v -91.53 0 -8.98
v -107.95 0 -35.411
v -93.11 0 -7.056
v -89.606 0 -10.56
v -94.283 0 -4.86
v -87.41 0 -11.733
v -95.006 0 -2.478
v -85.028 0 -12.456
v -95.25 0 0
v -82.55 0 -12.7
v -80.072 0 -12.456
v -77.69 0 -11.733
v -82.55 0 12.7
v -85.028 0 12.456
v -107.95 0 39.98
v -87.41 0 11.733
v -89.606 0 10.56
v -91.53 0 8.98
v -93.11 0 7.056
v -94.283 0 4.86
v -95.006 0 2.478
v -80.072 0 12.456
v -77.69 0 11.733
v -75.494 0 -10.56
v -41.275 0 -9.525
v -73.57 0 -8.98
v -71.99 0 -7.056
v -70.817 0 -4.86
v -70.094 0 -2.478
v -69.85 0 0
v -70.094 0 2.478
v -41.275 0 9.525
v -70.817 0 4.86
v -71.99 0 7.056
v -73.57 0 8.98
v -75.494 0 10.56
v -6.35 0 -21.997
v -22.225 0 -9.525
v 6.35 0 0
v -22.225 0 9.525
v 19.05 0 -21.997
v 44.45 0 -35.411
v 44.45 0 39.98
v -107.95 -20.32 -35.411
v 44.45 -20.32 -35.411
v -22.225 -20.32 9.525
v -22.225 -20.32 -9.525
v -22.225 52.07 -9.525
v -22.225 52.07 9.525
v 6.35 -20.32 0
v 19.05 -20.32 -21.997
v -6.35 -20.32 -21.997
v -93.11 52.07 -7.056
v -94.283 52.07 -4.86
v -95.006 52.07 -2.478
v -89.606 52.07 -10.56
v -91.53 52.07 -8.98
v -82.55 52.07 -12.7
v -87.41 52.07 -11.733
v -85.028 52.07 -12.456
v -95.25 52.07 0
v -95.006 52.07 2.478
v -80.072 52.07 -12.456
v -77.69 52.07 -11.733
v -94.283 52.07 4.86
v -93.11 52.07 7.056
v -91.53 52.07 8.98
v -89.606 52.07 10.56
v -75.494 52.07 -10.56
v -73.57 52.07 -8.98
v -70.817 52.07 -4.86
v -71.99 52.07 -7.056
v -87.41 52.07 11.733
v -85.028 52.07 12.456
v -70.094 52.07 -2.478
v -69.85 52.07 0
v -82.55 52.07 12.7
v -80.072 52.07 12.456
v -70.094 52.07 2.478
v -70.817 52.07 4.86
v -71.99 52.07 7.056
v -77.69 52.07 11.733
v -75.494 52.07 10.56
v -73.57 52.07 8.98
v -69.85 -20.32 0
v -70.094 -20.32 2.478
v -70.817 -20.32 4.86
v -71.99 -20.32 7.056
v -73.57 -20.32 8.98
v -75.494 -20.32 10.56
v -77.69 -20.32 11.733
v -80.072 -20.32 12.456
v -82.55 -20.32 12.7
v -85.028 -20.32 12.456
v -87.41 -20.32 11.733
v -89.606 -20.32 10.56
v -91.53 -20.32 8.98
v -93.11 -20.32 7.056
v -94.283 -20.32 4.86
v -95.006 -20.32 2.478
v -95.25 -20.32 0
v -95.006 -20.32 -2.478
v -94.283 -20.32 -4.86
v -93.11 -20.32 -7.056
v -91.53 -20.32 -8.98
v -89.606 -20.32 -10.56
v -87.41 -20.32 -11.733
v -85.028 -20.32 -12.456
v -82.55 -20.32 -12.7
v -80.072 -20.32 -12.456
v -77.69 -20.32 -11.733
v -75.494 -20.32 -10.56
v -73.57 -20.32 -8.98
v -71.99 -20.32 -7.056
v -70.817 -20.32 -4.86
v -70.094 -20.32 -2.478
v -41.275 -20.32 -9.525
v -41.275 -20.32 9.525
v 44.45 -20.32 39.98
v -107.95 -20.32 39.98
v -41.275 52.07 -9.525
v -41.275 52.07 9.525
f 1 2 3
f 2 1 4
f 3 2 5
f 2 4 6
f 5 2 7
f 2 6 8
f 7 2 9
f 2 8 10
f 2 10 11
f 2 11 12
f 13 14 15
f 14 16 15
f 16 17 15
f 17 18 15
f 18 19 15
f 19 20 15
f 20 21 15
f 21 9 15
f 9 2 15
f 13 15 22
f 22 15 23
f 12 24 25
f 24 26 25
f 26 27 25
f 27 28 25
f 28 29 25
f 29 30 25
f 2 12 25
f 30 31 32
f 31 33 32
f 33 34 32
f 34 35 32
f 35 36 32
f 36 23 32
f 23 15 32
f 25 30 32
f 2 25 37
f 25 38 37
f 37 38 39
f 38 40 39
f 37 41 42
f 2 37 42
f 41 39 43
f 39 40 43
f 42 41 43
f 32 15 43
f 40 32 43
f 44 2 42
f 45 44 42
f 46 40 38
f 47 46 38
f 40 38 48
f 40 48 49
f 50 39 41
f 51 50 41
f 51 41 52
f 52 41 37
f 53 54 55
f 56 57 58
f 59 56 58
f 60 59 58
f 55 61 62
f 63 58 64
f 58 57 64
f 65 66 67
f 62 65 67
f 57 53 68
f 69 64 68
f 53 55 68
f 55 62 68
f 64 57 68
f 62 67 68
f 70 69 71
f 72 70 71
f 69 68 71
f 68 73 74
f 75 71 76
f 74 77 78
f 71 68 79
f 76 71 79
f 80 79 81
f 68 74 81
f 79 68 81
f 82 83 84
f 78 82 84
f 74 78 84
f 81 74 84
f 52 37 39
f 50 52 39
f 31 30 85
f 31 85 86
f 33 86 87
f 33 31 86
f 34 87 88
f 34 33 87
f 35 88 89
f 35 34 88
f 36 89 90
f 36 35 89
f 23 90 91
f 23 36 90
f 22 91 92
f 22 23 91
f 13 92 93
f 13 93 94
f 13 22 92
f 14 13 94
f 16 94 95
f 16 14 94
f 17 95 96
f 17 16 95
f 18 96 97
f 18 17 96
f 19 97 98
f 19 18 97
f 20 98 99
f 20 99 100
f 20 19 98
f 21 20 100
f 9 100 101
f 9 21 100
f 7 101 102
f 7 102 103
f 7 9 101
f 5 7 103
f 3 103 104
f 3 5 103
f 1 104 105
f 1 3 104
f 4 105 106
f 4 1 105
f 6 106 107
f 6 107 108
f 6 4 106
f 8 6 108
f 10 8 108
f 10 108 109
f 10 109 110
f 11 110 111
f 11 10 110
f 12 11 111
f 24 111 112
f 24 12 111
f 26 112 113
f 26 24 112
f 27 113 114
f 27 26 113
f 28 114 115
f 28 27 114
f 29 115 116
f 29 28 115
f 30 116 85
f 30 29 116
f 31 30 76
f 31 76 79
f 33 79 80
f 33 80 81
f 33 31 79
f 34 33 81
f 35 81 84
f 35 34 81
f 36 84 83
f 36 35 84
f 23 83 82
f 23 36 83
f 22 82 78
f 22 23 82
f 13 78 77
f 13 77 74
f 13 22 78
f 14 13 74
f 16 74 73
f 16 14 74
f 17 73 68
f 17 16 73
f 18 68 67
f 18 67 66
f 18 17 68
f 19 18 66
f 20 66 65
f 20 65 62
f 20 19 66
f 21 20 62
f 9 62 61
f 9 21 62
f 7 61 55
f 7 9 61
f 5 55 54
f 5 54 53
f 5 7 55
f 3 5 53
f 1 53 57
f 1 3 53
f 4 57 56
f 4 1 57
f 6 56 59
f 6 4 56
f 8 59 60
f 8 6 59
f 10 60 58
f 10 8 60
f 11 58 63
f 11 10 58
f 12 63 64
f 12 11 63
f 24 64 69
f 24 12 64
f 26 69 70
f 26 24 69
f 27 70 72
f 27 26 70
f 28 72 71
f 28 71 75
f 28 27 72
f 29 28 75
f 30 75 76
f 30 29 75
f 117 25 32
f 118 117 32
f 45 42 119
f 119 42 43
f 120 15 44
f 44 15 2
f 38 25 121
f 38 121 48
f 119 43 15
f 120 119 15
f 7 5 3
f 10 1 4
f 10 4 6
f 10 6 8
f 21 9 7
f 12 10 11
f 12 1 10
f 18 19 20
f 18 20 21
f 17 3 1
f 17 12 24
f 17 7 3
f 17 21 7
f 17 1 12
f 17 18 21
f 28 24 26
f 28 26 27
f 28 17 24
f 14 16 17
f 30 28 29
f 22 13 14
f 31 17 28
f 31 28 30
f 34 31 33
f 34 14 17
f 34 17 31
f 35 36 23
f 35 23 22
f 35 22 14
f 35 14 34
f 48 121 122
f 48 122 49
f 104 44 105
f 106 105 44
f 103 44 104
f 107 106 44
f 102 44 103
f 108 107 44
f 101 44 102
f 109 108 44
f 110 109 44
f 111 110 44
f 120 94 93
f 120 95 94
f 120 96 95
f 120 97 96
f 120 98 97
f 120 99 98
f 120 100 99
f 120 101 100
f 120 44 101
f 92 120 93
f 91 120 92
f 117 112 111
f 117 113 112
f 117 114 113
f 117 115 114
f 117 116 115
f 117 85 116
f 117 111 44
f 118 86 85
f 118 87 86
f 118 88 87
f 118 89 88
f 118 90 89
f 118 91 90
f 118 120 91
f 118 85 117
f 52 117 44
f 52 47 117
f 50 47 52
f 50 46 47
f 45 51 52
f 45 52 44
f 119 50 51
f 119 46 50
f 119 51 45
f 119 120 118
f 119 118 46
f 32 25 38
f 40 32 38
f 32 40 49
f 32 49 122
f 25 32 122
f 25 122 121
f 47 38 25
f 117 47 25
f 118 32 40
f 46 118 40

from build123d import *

# Parameters (mm, degrees)
F0_R     = 12.7
F1_DEPTH = 52.07
F2_DEPTH = 20.32


with BuildPart() as f1:
    # F0 (on Front) → F1 (new body)
    with BuildSketch(Plane.XZ):
        with Locations((-82.55, 0)):
            Circle(F0_R)
        Polygon((-31.75, 0), (-22.225, 0), (-22.225, 9.525), (-41.275, 9.525), (-41.275, 0), align=None)
        Polygon((-22.225, -9.525), (-22.225, 0), (-31.75, 0), (-41.275, 0), (-41.275, -9.525), align=None)
    extrude(amount=-F1_DEPTH)


with BuildPart() as f2:
    # F0 (on Front) → F2 (new body)
    with BuildSketch(Plane.XZ):
        with Locations((-82.55, 0)):
            Circle(F0_R)
        Polygon((-107.95, -35.411008), (0, -35.411008), (44.45, -35.411008), (44.45, 39.980177), (-107.95, 39.980177), align=None)
        with Locations((-82.55, 0)):
            Circle(F0_R, mode=Mode.SUBTRACT)
        Polygon((-22.225, 9.525), (-22.225, 0), (-22.225, -9.525), (-41.275, -9.525), (-41.275, 0), (-41.275, 9.525), align=None, mode=Mode.SUBTRACT)
        Polygon((-6.35, -21.997045), (6.35, 0), (19.05, -21.997045), align=None, mode=Mode.SUBTRACT)
    extrude(amount=F2_DEPTH)


solid = Compound([f1.part, f2.part])
